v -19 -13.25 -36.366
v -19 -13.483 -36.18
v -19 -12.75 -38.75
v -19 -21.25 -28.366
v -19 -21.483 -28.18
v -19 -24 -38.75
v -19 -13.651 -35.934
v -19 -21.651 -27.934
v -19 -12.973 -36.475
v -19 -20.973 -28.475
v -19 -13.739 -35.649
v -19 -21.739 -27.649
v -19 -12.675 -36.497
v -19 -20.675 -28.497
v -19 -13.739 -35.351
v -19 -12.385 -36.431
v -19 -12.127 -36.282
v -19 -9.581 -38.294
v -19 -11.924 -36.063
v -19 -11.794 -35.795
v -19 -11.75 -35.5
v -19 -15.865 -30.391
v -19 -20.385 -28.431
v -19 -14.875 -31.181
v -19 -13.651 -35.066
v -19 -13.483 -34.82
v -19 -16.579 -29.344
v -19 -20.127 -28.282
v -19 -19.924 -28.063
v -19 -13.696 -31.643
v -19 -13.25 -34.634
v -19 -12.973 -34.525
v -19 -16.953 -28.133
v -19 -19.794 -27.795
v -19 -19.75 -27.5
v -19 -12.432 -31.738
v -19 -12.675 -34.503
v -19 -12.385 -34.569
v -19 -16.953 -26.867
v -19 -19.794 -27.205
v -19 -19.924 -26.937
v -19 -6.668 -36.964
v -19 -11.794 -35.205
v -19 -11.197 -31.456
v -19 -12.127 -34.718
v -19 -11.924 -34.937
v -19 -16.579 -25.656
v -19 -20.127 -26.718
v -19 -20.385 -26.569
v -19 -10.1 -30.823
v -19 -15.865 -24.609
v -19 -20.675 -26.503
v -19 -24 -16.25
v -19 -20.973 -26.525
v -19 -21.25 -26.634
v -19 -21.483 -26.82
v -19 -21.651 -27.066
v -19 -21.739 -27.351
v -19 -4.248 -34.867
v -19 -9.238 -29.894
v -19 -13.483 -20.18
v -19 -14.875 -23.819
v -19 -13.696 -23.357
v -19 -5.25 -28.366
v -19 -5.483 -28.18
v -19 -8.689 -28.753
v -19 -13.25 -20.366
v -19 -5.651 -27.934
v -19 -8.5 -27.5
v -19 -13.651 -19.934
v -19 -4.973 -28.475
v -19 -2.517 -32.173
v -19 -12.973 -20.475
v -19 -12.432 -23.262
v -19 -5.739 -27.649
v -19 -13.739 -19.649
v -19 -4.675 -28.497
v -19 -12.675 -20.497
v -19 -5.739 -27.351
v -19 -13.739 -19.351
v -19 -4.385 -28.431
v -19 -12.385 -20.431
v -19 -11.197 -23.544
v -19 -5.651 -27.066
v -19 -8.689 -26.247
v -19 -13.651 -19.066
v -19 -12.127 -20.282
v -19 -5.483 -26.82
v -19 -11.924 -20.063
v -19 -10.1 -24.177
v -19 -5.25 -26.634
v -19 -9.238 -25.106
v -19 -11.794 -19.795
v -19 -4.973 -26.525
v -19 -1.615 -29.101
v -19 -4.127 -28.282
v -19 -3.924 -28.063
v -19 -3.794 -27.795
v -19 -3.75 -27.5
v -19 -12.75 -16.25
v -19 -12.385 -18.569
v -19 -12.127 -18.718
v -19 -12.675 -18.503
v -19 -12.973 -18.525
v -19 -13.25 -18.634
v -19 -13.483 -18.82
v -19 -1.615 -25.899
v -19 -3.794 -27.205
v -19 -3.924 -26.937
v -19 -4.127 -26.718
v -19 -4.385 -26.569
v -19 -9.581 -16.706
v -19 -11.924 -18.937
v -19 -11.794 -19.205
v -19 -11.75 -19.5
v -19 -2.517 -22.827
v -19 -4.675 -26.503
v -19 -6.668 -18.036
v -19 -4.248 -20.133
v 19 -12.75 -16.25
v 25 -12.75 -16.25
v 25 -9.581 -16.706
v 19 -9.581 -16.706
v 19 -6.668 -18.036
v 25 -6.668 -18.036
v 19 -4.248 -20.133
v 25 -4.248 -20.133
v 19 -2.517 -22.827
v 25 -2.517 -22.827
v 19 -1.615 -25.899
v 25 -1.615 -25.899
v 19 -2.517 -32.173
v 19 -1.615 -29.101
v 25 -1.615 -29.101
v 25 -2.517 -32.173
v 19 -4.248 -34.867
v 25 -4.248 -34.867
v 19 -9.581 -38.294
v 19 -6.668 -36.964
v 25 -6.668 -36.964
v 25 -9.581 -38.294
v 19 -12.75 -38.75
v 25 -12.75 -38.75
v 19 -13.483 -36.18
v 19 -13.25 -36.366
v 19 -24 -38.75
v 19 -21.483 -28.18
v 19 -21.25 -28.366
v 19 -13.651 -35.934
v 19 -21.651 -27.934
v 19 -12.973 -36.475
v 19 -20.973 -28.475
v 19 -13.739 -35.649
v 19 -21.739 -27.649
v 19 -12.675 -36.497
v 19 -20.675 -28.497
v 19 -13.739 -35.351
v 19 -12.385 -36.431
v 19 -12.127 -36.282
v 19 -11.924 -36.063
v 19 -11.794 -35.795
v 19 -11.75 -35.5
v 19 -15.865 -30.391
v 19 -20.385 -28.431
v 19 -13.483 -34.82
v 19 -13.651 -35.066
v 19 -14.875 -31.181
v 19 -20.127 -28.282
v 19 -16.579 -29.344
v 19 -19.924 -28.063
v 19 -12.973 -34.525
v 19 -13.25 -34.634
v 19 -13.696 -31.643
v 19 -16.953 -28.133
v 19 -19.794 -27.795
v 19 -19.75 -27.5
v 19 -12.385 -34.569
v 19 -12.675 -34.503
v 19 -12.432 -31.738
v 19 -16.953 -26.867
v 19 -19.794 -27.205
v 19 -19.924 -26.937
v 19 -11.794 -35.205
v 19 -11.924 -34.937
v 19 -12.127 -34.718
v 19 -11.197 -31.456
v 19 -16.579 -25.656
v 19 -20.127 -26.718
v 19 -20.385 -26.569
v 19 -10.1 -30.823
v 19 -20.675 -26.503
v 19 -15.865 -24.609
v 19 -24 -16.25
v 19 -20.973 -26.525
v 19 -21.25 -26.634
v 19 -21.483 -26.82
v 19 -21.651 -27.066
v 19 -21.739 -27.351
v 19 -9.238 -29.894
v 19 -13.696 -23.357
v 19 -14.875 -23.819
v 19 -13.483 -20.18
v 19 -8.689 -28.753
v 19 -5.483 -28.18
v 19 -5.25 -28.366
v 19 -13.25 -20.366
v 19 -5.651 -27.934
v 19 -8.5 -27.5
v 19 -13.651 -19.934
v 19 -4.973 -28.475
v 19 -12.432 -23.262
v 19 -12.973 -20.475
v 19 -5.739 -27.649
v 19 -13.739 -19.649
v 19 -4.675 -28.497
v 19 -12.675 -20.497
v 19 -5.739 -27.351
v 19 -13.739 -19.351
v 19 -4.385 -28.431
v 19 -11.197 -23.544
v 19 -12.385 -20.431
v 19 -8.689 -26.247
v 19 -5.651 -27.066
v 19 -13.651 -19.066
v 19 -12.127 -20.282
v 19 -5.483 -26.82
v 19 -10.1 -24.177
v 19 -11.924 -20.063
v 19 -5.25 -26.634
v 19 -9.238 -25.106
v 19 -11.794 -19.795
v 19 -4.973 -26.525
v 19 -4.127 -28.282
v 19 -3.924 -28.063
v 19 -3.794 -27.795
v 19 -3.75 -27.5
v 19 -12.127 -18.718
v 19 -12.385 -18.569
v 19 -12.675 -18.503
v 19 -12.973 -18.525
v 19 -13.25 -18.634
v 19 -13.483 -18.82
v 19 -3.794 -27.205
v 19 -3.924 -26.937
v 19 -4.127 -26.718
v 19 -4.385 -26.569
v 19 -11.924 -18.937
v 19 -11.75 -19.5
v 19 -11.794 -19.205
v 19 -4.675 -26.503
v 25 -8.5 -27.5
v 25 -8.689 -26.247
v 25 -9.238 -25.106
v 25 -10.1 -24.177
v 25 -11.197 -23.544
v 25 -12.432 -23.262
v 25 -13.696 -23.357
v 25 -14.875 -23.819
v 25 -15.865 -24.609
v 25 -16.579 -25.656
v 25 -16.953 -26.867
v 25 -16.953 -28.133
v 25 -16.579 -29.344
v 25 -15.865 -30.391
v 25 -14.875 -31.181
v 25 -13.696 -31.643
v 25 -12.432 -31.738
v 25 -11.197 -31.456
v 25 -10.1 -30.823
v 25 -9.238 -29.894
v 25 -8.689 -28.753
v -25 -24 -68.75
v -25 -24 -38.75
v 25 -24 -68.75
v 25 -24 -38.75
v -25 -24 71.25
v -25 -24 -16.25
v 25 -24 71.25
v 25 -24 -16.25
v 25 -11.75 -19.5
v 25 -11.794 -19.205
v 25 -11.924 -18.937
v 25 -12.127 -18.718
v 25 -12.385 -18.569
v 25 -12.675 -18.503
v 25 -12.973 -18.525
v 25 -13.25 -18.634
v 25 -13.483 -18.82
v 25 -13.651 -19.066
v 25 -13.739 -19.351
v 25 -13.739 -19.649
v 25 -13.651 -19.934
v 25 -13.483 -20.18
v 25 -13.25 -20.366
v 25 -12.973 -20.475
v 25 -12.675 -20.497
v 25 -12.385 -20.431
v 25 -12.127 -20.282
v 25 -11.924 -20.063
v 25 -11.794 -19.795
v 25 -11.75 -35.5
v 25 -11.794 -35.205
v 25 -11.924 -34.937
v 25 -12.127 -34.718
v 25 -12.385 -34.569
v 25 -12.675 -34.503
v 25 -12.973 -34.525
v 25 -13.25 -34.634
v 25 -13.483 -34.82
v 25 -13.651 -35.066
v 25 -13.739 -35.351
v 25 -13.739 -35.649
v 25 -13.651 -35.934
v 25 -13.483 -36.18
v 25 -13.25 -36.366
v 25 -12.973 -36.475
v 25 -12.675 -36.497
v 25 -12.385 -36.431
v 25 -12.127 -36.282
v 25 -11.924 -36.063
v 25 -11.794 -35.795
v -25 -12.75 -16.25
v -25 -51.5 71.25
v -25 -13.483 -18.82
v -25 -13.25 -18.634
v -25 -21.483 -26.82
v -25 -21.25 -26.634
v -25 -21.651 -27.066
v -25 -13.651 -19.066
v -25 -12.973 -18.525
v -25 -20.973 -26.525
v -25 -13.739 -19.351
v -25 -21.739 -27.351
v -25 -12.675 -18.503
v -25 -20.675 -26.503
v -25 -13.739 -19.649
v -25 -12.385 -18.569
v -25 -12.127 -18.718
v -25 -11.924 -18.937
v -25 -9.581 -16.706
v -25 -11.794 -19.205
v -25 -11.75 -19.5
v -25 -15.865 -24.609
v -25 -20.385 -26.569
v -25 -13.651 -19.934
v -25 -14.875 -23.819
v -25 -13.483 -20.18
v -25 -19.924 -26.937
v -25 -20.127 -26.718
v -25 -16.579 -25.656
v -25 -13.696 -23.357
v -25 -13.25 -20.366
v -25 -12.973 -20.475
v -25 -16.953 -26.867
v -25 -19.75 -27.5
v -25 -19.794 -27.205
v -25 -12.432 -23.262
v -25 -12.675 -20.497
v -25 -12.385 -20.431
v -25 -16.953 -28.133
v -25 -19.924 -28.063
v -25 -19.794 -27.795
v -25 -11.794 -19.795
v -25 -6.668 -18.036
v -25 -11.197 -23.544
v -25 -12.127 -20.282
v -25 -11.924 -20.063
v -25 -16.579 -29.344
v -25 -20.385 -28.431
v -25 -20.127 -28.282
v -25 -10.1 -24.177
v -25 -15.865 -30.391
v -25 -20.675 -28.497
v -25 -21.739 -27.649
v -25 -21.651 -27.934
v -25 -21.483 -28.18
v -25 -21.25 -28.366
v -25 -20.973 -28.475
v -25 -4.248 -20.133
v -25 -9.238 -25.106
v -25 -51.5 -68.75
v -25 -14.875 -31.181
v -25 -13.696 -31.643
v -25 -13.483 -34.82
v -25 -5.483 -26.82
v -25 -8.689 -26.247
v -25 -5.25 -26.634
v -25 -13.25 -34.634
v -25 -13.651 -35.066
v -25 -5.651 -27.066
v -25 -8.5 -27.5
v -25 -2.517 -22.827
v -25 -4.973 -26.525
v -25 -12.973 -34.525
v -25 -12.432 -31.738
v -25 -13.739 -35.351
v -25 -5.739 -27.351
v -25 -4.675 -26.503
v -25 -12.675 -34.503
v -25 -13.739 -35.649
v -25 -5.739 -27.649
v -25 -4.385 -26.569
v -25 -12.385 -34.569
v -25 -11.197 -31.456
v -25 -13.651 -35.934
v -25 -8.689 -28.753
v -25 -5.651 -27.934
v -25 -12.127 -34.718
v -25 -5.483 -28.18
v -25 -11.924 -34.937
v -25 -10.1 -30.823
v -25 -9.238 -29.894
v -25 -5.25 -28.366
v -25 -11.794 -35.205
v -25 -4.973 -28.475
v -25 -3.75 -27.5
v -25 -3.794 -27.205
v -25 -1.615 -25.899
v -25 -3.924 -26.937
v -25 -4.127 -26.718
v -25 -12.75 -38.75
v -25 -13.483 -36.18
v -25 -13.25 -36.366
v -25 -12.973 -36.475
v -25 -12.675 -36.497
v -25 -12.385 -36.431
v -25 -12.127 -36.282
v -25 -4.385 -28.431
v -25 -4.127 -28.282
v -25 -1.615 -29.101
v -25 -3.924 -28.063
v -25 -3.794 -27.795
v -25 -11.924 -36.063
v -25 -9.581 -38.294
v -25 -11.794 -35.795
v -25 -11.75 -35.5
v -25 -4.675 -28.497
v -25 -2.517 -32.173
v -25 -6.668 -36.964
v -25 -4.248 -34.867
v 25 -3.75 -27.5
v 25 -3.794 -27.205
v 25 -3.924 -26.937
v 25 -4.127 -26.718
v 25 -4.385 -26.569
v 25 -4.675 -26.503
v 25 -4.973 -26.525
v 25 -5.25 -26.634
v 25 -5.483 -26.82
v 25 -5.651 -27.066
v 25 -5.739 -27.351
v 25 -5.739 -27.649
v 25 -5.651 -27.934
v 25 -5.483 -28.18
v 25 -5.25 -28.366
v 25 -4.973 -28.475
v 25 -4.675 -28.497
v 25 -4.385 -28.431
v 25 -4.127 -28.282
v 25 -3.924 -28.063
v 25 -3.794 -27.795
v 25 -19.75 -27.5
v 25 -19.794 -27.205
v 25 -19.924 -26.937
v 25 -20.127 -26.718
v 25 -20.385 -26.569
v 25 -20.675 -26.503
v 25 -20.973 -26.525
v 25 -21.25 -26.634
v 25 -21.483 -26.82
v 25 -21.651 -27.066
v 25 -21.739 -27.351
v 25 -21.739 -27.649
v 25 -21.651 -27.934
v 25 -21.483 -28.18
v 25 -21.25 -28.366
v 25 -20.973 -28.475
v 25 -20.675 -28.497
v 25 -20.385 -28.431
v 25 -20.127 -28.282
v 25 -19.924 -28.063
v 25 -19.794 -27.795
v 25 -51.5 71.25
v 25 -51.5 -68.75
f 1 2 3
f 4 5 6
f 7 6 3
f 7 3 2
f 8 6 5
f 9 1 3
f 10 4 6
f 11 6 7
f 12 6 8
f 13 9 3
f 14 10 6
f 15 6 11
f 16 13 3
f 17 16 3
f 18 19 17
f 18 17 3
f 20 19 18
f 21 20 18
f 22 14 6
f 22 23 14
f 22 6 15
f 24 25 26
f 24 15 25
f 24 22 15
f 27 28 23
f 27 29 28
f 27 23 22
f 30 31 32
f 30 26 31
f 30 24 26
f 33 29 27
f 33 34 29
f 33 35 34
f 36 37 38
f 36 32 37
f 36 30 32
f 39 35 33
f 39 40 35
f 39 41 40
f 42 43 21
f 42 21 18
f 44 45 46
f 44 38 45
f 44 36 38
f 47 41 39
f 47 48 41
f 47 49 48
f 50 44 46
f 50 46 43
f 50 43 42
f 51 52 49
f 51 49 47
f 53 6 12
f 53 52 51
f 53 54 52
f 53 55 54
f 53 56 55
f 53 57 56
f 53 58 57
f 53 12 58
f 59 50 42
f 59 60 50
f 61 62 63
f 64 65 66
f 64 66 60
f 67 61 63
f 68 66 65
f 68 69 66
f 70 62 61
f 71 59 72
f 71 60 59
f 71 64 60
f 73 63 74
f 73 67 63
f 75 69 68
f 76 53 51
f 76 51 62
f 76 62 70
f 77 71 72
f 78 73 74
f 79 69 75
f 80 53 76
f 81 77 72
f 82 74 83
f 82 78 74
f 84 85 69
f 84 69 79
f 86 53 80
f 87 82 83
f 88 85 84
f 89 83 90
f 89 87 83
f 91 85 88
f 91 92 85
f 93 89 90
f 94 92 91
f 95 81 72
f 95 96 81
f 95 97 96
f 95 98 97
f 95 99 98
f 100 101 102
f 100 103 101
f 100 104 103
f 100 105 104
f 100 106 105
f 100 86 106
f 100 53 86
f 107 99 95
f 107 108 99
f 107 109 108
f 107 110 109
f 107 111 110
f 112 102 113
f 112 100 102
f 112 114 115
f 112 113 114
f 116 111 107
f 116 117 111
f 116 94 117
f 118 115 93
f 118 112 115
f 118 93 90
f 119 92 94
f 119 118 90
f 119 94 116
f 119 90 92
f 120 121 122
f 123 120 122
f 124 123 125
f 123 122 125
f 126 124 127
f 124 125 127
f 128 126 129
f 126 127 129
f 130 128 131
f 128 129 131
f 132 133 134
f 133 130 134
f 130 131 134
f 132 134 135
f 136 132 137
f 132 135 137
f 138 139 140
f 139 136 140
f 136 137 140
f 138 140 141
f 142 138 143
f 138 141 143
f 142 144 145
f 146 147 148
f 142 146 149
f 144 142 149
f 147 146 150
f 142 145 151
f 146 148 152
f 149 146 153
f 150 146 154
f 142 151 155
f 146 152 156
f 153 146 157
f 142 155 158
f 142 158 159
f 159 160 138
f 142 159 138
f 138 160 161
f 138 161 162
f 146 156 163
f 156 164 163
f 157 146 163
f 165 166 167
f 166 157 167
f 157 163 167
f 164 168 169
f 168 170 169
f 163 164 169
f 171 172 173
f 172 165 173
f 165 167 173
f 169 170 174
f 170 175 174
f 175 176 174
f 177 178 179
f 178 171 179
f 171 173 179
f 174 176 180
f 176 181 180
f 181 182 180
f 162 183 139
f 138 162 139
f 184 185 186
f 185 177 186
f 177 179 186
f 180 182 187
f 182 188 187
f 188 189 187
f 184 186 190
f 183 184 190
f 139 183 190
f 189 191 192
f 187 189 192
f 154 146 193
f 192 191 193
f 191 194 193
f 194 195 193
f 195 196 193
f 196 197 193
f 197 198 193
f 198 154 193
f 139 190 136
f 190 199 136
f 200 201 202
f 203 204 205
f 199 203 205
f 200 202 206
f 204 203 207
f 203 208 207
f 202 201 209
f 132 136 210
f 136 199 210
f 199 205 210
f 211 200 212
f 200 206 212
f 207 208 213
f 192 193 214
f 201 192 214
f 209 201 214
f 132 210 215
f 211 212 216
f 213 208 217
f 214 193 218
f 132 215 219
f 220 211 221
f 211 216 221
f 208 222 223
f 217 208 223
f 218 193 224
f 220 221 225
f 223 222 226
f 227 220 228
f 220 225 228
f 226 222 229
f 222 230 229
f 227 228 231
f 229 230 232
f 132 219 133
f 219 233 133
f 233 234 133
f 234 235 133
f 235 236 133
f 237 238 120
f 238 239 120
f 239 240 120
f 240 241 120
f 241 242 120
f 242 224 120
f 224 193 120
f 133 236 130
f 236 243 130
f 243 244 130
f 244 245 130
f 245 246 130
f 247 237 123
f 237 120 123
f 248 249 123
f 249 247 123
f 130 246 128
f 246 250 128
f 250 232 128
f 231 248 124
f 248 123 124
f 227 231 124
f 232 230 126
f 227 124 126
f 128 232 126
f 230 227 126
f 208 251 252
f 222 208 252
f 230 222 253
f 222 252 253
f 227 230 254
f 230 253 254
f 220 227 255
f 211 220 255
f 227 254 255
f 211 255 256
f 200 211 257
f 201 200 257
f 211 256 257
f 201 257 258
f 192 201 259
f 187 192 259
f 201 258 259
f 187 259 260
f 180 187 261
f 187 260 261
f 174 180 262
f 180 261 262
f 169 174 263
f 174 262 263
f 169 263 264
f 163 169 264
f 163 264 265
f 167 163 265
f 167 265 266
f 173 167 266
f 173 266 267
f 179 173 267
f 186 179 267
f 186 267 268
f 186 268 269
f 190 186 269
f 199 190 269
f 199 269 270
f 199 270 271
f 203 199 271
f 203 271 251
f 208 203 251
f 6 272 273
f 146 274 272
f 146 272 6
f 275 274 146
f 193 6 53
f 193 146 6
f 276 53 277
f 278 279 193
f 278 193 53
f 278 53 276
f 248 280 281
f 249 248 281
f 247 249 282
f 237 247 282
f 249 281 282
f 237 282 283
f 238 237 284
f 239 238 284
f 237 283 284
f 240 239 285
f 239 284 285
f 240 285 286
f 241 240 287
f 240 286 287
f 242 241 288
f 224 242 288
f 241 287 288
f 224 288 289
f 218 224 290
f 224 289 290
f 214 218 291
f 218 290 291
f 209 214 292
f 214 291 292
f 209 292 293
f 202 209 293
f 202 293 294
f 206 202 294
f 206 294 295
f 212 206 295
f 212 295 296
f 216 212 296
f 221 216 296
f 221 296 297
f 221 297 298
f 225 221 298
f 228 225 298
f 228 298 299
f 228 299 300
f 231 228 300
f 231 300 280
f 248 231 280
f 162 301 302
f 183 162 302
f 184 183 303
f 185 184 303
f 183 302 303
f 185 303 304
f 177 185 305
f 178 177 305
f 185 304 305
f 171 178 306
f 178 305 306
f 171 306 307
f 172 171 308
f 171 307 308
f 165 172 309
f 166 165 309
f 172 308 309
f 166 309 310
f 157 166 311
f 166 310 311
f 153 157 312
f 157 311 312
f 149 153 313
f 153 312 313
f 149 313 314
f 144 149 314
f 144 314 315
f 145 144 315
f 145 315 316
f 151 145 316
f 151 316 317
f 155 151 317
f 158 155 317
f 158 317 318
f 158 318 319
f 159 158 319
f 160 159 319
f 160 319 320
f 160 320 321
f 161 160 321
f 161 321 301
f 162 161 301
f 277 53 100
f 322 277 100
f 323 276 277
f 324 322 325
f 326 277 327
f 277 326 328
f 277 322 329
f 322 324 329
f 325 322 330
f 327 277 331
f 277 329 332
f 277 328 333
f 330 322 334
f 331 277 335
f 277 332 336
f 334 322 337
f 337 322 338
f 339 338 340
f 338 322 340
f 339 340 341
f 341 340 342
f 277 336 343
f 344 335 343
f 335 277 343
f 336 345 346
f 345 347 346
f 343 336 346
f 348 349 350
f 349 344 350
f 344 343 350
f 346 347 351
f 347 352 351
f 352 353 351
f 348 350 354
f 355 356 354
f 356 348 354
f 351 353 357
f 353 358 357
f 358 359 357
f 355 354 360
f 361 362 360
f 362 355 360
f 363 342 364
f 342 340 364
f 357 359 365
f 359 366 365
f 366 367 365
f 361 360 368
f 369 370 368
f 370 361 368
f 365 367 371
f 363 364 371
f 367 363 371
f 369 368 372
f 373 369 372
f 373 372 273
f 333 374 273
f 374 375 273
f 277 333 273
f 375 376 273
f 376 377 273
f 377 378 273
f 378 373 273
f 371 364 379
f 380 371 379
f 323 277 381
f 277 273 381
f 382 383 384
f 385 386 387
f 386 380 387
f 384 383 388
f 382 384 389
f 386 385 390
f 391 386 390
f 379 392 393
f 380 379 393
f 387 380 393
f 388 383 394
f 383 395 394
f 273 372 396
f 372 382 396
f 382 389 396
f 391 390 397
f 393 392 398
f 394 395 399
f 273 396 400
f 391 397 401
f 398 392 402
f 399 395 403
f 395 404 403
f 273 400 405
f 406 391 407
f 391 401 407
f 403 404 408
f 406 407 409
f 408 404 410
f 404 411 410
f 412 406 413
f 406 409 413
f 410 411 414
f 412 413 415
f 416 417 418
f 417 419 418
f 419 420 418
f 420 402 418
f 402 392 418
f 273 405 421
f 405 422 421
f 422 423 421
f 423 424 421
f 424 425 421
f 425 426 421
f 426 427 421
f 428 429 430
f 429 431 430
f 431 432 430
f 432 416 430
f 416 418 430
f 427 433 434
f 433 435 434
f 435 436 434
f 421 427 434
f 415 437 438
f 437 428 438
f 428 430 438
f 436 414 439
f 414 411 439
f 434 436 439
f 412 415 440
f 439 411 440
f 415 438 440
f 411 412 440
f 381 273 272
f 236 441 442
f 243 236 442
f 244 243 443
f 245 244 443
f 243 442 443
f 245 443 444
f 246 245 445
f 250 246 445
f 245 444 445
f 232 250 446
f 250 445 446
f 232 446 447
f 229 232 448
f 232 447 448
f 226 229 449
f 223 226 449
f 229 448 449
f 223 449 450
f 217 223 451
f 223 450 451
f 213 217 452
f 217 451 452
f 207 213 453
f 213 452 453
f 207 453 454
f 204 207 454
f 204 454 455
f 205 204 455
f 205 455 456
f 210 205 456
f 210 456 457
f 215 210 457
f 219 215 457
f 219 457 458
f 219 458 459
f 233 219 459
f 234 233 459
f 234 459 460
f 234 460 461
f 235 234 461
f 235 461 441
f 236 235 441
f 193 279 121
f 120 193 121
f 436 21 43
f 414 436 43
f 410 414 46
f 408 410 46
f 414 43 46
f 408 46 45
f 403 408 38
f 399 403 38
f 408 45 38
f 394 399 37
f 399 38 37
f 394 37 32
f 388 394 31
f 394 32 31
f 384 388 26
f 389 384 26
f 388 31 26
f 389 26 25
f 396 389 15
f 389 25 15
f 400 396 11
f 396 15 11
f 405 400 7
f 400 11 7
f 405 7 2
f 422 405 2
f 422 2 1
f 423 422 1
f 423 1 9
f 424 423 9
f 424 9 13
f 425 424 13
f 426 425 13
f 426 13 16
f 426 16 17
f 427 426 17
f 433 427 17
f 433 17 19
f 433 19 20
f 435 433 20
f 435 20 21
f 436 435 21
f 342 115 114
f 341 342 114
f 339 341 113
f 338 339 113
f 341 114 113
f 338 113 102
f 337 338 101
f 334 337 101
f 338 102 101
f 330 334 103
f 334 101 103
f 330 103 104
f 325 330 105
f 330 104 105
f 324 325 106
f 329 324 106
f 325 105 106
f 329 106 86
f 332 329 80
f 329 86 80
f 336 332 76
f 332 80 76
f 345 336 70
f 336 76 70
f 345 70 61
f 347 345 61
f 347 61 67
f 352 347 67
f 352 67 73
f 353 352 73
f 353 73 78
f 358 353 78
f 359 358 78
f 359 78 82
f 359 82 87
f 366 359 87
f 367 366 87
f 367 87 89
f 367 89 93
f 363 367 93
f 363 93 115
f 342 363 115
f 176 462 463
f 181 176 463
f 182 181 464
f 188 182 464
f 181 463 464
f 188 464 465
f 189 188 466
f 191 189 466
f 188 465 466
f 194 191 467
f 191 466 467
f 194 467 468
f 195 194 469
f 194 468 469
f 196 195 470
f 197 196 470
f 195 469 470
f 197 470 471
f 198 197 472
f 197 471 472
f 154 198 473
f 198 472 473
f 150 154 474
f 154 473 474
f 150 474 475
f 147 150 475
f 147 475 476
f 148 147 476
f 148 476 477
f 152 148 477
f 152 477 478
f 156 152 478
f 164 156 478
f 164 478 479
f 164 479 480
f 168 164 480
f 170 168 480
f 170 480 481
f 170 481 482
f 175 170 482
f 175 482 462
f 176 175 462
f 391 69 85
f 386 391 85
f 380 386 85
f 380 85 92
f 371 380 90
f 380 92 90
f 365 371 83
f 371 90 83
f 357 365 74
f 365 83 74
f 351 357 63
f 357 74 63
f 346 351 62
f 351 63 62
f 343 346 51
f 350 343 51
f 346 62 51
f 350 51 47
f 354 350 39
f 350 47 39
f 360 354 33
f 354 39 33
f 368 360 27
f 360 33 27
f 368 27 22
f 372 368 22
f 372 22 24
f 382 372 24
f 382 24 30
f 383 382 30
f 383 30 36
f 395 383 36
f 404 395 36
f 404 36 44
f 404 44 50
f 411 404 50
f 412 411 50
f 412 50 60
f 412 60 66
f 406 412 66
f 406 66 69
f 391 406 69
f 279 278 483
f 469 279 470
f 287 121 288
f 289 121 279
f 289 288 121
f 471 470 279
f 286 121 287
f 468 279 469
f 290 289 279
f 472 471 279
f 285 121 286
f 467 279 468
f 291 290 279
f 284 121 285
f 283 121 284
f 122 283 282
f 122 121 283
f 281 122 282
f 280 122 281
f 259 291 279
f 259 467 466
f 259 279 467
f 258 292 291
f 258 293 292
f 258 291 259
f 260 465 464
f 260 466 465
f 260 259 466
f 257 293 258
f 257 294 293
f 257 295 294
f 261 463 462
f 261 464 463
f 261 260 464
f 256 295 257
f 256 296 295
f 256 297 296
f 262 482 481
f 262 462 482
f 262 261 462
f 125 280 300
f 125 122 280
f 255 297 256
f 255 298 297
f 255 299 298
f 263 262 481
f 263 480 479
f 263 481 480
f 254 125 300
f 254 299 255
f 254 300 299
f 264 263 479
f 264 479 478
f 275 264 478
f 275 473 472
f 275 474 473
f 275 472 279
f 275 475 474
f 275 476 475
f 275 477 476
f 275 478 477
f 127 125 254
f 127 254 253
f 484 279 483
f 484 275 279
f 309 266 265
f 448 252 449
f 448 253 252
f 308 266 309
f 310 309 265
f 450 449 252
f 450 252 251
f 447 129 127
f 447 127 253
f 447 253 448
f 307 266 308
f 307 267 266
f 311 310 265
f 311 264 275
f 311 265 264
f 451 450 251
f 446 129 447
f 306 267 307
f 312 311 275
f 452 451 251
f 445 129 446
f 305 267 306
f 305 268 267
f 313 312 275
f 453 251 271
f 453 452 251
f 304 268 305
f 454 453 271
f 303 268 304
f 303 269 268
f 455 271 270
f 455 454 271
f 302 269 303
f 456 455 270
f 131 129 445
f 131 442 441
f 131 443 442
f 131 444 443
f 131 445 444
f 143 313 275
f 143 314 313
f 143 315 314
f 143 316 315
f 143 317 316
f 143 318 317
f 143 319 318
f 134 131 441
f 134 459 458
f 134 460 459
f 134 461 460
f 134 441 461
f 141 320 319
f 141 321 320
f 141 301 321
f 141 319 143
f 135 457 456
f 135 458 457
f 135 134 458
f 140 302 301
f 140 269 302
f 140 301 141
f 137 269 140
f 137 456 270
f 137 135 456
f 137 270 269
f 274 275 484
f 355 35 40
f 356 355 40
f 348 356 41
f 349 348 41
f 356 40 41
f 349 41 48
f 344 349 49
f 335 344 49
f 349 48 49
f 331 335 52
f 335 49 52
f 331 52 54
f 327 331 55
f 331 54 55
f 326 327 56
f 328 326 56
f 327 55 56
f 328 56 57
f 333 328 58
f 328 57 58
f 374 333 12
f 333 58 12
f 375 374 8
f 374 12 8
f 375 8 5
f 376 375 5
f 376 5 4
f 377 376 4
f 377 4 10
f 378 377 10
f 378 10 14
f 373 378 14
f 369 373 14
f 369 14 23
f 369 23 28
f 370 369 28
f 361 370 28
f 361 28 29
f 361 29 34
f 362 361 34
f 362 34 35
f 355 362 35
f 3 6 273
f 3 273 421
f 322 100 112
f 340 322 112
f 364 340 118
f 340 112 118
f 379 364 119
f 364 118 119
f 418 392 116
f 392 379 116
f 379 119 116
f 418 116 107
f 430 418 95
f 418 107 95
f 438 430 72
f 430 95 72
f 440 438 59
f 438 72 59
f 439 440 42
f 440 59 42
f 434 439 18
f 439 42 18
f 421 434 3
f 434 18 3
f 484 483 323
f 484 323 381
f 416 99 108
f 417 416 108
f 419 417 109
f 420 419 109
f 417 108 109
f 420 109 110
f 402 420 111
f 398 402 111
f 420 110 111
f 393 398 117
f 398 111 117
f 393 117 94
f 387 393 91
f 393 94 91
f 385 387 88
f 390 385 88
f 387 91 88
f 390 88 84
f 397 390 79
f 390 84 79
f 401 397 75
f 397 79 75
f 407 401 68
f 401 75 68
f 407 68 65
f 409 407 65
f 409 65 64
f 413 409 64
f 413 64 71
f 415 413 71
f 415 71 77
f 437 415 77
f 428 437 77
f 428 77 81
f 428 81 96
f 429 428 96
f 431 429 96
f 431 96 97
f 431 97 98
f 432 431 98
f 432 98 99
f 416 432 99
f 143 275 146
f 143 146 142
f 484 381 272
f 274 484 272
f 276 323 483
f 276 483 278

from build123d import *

# Parameters (mm, degrees)
SKETCH1_W           = 50
SKETCH1_H           = 170
BOSS_EXTRUDE1_DEPTH = 55
SKETCH2_W           = 34
SKETCH2_H           = 27
CUT_EXTRUDE1_DEPTH  = 181.416185527
SKETCH3_W           = 10
SKETCH3_H           = 24
SKETCH3_R           = 4.25
SKETCH3_R_2         = 1
CUT_EXTRUDE2_DEPTH  = 186.539753153
SKETCH4_W           = 2
SKETCH4_H           = 24
CUT_EXTRUDE3_DEPTH  = 178.623196683
SKETCH5_W           = 6.25
SKETCH5_H           = 11.25
CUT_EXTRUDE4_DEPTH  = 186.539753153
SKETCH6_W           = 38
SKETCH6_H           = 10
CUT_EXTRUDE5_DEPTH  = 181.416185527
SKETCH8_W           = 13.25
SKETCH8_H           = 2.25
CUT_EXTRUDE7_DEPTH  = 186.539753153
SKETCH9_W           = 34
SKETCH9_H           = 35.25
CUT_EXTRUDE8_DEPTH  = 179.297679458
SKETCH11_W          = 13.25
SKETCH11_H          = 20.25
CUT_EXTRUDE9_DEPTH  = 184.480414486
SKETCH12_W          = 28.5
SKETCH12_H          = 15
BOSS_EXTRUDE2_DEPTH = 8
SKETCH14_W          = 34
SKETCH14_H          = 15
SKETCH14_H_2        = 10.25
BOSS_EXTRUDE3_DEPTH = 13.25
SKETCH16_R          = 4.5
SKETCH16_R_2        = 2.5
CUT_EXTRUDE13_DEPTH = 8
SKETCH17_R          = 4.5
SKETCH17_W          = 55
SKETCH17_H          = 10.25
CUT_EXTRUDE15_DEPTH = 175.384811552
SKETCH18_W          = 71.25
SKETCH18_H          = 27.5
SKETCH18_W_2        = 13.75
SKETCH18_W_3        = 16.25
BOSS_EXTRUDE4_DEPTH = 50


with BuildPart() as part:
    # Sketch1 → Boss-Extrude1 (new body)
    with BuildSketch(Plane.XY):
        with Locations((0, -85)):
            Rectangle(SKETCH1_W, SKETCH1_H)
    extrude(amount=-BOSS_EXTRUDE1_DEPTH)

    # Sketch2 → Cut-Extrude1 (cut, through all)
    with BuildSketch(Plane.XY):
        with Locations((0, -13.5)):
            Rectangle(SKETCH2_W, SKETCH2_H)
    extrude(amount=-CUT_EXTRUDE1_DEPTH, mode=Mode.SUBTRACT)

    # Sketch3 → Cut-Extrude2 (cut, through all)
    with BuildSketch(Plane(origin=(25, 0, 0), x_dir=(0, 0, -1), z_dir=(1, 0, 0))):
        with Locations((50, -12)):
            Rectangle(SKETCH3_W, SKETCH3_H)
        with Locations((5, -12)):
            Rectangle(SKETCH3_W, SKETCH3_H)
        with Locations(Location((27.5, -12.75, 0), (0, 0, 90))):
            Circle(SKETCH3_R)
        with Locations(Location((35.5, -12.75, 0), (0, 0, 90))):
            Circle(SKETCH3_R_2)
        with Locations(Location((27.5, -4.75, 0), (0, 0, 90))):
            Circle(SKETCH3_R_2)
        with Locations(Location((27.5, -20.75, 0), (0, 0, 90))):
            Circle(SKETCH3_R_2)
        with Locations(Location((19.5, -12.75, 0), (0, 0, 90))):
            Circle(SKETCH3_R_2)
    extrude(amount=-CUT_EXTRUDE2_DEPTH, mode=Mode.SUBTRACT)

    # Sketch4 → Cut-Extrude3 (cut, through all)
    with BuildSketch(Plane.XY.offset(-10)):
        with Locations((-18, -12)):
            Rectangle(SKETCH4_W, SKETCH4_H)
        with Locations((18, -12)):
            Rectangle(SKETCH4_W, SKETCH4_H)
    extrude(amount=-CUT_EXTRUDE3_DEPTH, mode=Mode.SUBTRACT)

    # Sketch5 → Cut-Extrude4 (cut, through all)
    with BuildSketch(Plane(origin=(25, 0, 0), x_dir=(0, 0, -1), z_dir=(1, 0, 0))):
        with BuildLine():
            Line((45, 0), (10, 0))
            Line((10, 0), (10, -12.75))
            Line((10, -12.75), (16.25, -12.75))
            ThreePointArc((16.25, -12.75), (27.5, -1.5), (38.75, -12.75))
            Line((38.75, -12.75), (45, -12.75))
            Line((45, -12.75), (45, 0))
        make_face()
        with Locations((13.125, -18.375)):
            Rectangle(SKETCH5_W, SKETCH5_H)
        with Locations((41.875, -18.375)):
            Rectangle(SKETCH5_W, SKETCH5_H)
    extrude(amount=-CUT_EXTRUDE4_DEPTH, mode=Mode.SUBTRACT)

    # Sketch6 → Cut-Extrude5 (cut, through all)
    with BuildSketch(Plane.XY):
        with Locations((0, -29)):
            Rectangle(SKETCH6_W, SKETCH6_H)
    extrude(amount=-CUT_EXTRUDE5_DEPTH, mode=Mode.SUBTRACT)

    # Sketch8 → Cut-Extrude7 (cut, through all)
    with BuildSketch(Plane(origin=(25, 0, 0), x_dir=(0, 0, -1), z_dir=(1, 0, 0))):
        with BuildLine():
            Line((27.5, -157.5), (27.5, -132.5))
            Line((27.5, -132.5), (13.25, -132.5))
            Line((13.25, -132.5), (13.25, -167.75))
            Line((13.25, -167.75), (17.25, -167.75))
            ThreePointArc((17.25, -167.75), (20.252155493, -160.502155493), (27.5, -157.5))
        make_face()
        with BuildLine():
            Line((41.75, -167.75), (41.75, -132.5))
            Line((41.75, -132.5), (27.5, -132.5))
            Line((27.5, -132.5), (27.5, -157.5))
            ThreePointArc((27.5, -157.5), (34.747844507, -160.502155493), (37.75, -167.75))
            Line((37.75, -167.75), (41.75, -167.75))
        make_face()
        with Locations((48.375, -168.875)):
            Rectangle(SKETCH8_W, SKETCH8_H)
        with Locations((6.625, -168.875)):
            Rectangle(SKETCH8_W, SKETCH8_H)
        with BuildLine():
            Line((17.25, -167.75), (13.25, -167.75))
            Line((13.25, -167.75), (13.25, -170))
            Line((13.25, -170), (17.5, -170))
            ThreePointArc((17.5, -170), (17.31269172, -168.881923142), (17.25, -167.75))
        make_face()
        with BuildLine():
            Line((41.75, -170), (41.75, -167.75))
            Line((41.75, -167.75), (37.75, -167.75))
            ThreePointArc((37.75, -167.75), (37.68730828, -168.881923142), (37.5, -170))
            Line((37.5, -170), (41.75, -170))
        make_face()
        with BuildLine():
            Line((27.5, -167.75), (27.5, -157.5))
            ThreePointArc((27.5, -157.5), (20.252155493, -160.502155493), (17.25, -167.75))
            Line((17.25, -167.75), (27.5, -167.75))
        make_face()
        with BuildLine():
            ThreePointArc((37.75, -167.75), (34.747844507, -160.502155493), (27.5, -157.5))
            Line((27.5, -157.5), (27.5, -167.75))
            Line((27.5, -167.75), (37.75, -167.75))
        make_face()
        with BuildLine():
            Line((27.5, -170), (27.5, -167.75))
            Line((27.5, -167.75), (17.25, -167.75))
            ThreePointArc((17.25, -167.75), (17.31269172, -168.881923142), (17.5, -170))
            Line((17.5, -170), (27.5, -170))
        make_face()
        with BuildLine():
            ThreePointArc((37.5, -170), (37.68730828, -168.881923142), (37.75, -167.75))
            Line((37.75, -167.75), (27.5, -167.75))
            Line((27.5, -167.75), (27.5, -170))
            Line((27.5, -170), (37.5, -170))
        make_face()
    extrude(amount=-CUT_EXTRUDE7_DEPTH, mode=Mode.SUBTRACT)

    # Sketch9 → Cut-Extrude8 (cut, through all)
    with BuildSketch(Plane.XY):
        with Locations((0, -150.125)):
            Rectangle(SKETCH9_W, SKETCH9_H)
    extrude(amount=-CUT_EXTRUDE8_DEPTH, mode=Mode.SUBTRACT)

    # Sketch11 → Cut-Extrude9 (cut, through all)
    with BuildSketch(Plane(origin=(25, 0, 0), x_dir=(0, 0, -1), z_dir=(1, 0, 0))):
        with BuildLine():
            ThreePointArc((17.25, -167.75), (20.252155493, -160.502155493), (27.5, -157.5))
            Line((27.5, -157.5), (27.5, -147.5))
            Line((27.5, -147.5), (13.25, -147.5))
            Line((13.25, -147.5), (13.25, -167.75))
            Line((13.25, -167.75), (17.25, -167.75))
        make_face()
        with BuildLine():
            Line((27.5, -147.5), (27.5, -157.5))
            ThreePointArc((27.5, -157.5), (34.747844507, -160.502155493), (37.75, -167.75))
            Line((37.75, -167.75), (41.75, -167.75))
            Line((41.75, -167.75), (41.75, -147.5))
            Line((41.75, -147.5), (27.5, -147.5))
        make_face()
        with Locations((48.375, -157.625)):
            Rectangle(SKETCH11_W, SKETCH11_H)
        with Locations((6.625, -157.625)):
            Rectangle(SKETCH11_W, SKETCH11_H)
    extrude(amount=-CUT_EXTRUDE9_DEPTH, mode=Mode.SUBTRACT)

    # Sketch12 → Boss-Extrude2 (add)
    with BuildSketch(Plane(origin=(25, 0, 0), x_dir=(0, 0, -1), z_dir=(1, 0, 0))):
        with Locations((27.5, -140)):
            Rectangle(SKETCH12_W, SKETCH12_H)
    boss_extrude2 = extrude(amount=-BOSS_EXTRUDE2_DEPTH)

    # Mirror1: Boss-Extrude2 across plane
    add(boss_extrude2.mirror(Plane(origin=(0, 0, 0), x_dir=(0, 0, 1), z_dir=(1, 0, 0))))

    # Sketch14 → Boss-Extrude3 (add)
    with BuildSketch(Plane.XY):
        with Locations((0, -140)):
            Rectangle(SKETCH14_W, SKETCH14_H)
        with Locations((0, -152.625)):
            Rectangle(SKETCH14_W, SKETCH14_H_2)
    boss_extrude3 = extrude(amount=-BOSS_EXTRUDE3_DEPTH)

    # Mirror2: Boss-Extrude3 across plane
    add(boss_extrude3.mirror(Plane.XY.offset(-27.5)))

    # Sketch16 → Cut-Extrude13 (cut)
    # profile 1 of 3: a face of its own
    with BuildSketch(Plane(origin=(25, 0, 0), x_dir=(0, 0, -1), z_dir=(1, 0, 0))):
        with Locations(Location((16.5, -135.75, 0), (0, 0, 90))):
            Circle(SKETCH16_R)
        with Locations((16.5, -135.75)):
            Circle(SKETCH16_R_2, mode=Mode.SUBTRACT)
    # profile 2 of 3: a face of its own
    with BuildSketch(Plane(origin=(25, 0, 0), x_dir=(0, 0, -1), z_dir=(1, 0, 0))):
        with Locations((16.5, -135.75)):
            Circle(SKETCH16_R_2)
    # profile 3 of 3: a face of its own
    with BuildSketch(Plane(origin=(25, 0, 0), x_dir=(0, 0, -1), z_dir=(1, 0, 0))):
        with Locations(Location((38.5, -135.75, 0), (0, 0, 90))):
            Circle(SKETCH16_R)
    cut_extrude13 = extrude(amount=-CUT_EXTRUDE13_DEPTH, mode=Mode.SUBTRACT)

    # Mirror3: Cut-Extrude13 across plane
    add(cut_extrude13.mirror(Plane(origin=(0, 0, 0), x_dir=(0, 0, 1), z_dir=(1, 0, 0))), mode=Mode.SUBTRACT)

    # Sketch17 → Cut-Extrude15 (cut, through all)
    # profile 1 of 4: a face of its own
    with BuildSketch(Plane(origin=(25, 0, 0), x_dir=(0, 0, -1), z_dir=(1, 0, 0))):
        Polygon((55, -51.5), (27.5, -51.5), (0, -51.5), (0, -147.5), (55, -147.5), align=None)
        with Locations((16.5, -135.75)):
            Circle(SKETCH17_R, mode=Mode.SUBTRACT)
        with Locations((38.5, -135.75)):
            Circle(SKETCH17_R, mode=Mode.SUBTRACT)
    # profile 2 of 4: a face of its own
    with BuildSketch(Plane(origin=(25, 0, 0), x_dir=(0, 0, -1), z_dir=(1, 0, 0))):
        with Locations((27.5, -152.625)):
            Rectangle(SKETCH17_W, SKETCH17_H)
    # profile 3 of 4: a face of its own
    with BuildSketch(Plane(origin=(25, 0, 0), x_dir=(0, 0, -1), z_dir=(1, 0, 0))):
        with Locations((38.5, -135.75)):
            Circle(SKETCH17_R)
    # profile 4 of 4: a face of its own
    with BuildSketch(Plane(origin=(25, 0, 0), x_dir=(0, 0, -1), z_dir=(1, 0, 0))):
        with Locations((16.5, -135.75)):
            Circle(SKETCH17_R)
    extrude(amount=-CUT_EXTRUDE15_DEPTH, mode=Mode.SUBTRACT)

    # Sketch18 → Boss-Extrude4 (add)
    with BuildSketch(Plane(origin=(25, 0, 0), x_dir=(0, 0, -1), z_dir=(1, 0, 0))):
        with Locations((-35.625, -37.75)):
            Rectangle(SKETCH18_W, SKETCH18_H)
        with Locations((61.875, -37.75)):
            Rectangle(SKETCH18_W_2, SKETCH18_H)
        Polygon((38.75, -51.5), (38.75, -24), (16.25, -24), (0, -24), (0, -51.5), align=None)
        with Locations((46.875, -37.75)):
            Rectangle(SKETCH18_W_3, SKETCH18_H)
    extrude(amount=-BOSS_EXTRUDE4_DEPTH)


solid = part.part
